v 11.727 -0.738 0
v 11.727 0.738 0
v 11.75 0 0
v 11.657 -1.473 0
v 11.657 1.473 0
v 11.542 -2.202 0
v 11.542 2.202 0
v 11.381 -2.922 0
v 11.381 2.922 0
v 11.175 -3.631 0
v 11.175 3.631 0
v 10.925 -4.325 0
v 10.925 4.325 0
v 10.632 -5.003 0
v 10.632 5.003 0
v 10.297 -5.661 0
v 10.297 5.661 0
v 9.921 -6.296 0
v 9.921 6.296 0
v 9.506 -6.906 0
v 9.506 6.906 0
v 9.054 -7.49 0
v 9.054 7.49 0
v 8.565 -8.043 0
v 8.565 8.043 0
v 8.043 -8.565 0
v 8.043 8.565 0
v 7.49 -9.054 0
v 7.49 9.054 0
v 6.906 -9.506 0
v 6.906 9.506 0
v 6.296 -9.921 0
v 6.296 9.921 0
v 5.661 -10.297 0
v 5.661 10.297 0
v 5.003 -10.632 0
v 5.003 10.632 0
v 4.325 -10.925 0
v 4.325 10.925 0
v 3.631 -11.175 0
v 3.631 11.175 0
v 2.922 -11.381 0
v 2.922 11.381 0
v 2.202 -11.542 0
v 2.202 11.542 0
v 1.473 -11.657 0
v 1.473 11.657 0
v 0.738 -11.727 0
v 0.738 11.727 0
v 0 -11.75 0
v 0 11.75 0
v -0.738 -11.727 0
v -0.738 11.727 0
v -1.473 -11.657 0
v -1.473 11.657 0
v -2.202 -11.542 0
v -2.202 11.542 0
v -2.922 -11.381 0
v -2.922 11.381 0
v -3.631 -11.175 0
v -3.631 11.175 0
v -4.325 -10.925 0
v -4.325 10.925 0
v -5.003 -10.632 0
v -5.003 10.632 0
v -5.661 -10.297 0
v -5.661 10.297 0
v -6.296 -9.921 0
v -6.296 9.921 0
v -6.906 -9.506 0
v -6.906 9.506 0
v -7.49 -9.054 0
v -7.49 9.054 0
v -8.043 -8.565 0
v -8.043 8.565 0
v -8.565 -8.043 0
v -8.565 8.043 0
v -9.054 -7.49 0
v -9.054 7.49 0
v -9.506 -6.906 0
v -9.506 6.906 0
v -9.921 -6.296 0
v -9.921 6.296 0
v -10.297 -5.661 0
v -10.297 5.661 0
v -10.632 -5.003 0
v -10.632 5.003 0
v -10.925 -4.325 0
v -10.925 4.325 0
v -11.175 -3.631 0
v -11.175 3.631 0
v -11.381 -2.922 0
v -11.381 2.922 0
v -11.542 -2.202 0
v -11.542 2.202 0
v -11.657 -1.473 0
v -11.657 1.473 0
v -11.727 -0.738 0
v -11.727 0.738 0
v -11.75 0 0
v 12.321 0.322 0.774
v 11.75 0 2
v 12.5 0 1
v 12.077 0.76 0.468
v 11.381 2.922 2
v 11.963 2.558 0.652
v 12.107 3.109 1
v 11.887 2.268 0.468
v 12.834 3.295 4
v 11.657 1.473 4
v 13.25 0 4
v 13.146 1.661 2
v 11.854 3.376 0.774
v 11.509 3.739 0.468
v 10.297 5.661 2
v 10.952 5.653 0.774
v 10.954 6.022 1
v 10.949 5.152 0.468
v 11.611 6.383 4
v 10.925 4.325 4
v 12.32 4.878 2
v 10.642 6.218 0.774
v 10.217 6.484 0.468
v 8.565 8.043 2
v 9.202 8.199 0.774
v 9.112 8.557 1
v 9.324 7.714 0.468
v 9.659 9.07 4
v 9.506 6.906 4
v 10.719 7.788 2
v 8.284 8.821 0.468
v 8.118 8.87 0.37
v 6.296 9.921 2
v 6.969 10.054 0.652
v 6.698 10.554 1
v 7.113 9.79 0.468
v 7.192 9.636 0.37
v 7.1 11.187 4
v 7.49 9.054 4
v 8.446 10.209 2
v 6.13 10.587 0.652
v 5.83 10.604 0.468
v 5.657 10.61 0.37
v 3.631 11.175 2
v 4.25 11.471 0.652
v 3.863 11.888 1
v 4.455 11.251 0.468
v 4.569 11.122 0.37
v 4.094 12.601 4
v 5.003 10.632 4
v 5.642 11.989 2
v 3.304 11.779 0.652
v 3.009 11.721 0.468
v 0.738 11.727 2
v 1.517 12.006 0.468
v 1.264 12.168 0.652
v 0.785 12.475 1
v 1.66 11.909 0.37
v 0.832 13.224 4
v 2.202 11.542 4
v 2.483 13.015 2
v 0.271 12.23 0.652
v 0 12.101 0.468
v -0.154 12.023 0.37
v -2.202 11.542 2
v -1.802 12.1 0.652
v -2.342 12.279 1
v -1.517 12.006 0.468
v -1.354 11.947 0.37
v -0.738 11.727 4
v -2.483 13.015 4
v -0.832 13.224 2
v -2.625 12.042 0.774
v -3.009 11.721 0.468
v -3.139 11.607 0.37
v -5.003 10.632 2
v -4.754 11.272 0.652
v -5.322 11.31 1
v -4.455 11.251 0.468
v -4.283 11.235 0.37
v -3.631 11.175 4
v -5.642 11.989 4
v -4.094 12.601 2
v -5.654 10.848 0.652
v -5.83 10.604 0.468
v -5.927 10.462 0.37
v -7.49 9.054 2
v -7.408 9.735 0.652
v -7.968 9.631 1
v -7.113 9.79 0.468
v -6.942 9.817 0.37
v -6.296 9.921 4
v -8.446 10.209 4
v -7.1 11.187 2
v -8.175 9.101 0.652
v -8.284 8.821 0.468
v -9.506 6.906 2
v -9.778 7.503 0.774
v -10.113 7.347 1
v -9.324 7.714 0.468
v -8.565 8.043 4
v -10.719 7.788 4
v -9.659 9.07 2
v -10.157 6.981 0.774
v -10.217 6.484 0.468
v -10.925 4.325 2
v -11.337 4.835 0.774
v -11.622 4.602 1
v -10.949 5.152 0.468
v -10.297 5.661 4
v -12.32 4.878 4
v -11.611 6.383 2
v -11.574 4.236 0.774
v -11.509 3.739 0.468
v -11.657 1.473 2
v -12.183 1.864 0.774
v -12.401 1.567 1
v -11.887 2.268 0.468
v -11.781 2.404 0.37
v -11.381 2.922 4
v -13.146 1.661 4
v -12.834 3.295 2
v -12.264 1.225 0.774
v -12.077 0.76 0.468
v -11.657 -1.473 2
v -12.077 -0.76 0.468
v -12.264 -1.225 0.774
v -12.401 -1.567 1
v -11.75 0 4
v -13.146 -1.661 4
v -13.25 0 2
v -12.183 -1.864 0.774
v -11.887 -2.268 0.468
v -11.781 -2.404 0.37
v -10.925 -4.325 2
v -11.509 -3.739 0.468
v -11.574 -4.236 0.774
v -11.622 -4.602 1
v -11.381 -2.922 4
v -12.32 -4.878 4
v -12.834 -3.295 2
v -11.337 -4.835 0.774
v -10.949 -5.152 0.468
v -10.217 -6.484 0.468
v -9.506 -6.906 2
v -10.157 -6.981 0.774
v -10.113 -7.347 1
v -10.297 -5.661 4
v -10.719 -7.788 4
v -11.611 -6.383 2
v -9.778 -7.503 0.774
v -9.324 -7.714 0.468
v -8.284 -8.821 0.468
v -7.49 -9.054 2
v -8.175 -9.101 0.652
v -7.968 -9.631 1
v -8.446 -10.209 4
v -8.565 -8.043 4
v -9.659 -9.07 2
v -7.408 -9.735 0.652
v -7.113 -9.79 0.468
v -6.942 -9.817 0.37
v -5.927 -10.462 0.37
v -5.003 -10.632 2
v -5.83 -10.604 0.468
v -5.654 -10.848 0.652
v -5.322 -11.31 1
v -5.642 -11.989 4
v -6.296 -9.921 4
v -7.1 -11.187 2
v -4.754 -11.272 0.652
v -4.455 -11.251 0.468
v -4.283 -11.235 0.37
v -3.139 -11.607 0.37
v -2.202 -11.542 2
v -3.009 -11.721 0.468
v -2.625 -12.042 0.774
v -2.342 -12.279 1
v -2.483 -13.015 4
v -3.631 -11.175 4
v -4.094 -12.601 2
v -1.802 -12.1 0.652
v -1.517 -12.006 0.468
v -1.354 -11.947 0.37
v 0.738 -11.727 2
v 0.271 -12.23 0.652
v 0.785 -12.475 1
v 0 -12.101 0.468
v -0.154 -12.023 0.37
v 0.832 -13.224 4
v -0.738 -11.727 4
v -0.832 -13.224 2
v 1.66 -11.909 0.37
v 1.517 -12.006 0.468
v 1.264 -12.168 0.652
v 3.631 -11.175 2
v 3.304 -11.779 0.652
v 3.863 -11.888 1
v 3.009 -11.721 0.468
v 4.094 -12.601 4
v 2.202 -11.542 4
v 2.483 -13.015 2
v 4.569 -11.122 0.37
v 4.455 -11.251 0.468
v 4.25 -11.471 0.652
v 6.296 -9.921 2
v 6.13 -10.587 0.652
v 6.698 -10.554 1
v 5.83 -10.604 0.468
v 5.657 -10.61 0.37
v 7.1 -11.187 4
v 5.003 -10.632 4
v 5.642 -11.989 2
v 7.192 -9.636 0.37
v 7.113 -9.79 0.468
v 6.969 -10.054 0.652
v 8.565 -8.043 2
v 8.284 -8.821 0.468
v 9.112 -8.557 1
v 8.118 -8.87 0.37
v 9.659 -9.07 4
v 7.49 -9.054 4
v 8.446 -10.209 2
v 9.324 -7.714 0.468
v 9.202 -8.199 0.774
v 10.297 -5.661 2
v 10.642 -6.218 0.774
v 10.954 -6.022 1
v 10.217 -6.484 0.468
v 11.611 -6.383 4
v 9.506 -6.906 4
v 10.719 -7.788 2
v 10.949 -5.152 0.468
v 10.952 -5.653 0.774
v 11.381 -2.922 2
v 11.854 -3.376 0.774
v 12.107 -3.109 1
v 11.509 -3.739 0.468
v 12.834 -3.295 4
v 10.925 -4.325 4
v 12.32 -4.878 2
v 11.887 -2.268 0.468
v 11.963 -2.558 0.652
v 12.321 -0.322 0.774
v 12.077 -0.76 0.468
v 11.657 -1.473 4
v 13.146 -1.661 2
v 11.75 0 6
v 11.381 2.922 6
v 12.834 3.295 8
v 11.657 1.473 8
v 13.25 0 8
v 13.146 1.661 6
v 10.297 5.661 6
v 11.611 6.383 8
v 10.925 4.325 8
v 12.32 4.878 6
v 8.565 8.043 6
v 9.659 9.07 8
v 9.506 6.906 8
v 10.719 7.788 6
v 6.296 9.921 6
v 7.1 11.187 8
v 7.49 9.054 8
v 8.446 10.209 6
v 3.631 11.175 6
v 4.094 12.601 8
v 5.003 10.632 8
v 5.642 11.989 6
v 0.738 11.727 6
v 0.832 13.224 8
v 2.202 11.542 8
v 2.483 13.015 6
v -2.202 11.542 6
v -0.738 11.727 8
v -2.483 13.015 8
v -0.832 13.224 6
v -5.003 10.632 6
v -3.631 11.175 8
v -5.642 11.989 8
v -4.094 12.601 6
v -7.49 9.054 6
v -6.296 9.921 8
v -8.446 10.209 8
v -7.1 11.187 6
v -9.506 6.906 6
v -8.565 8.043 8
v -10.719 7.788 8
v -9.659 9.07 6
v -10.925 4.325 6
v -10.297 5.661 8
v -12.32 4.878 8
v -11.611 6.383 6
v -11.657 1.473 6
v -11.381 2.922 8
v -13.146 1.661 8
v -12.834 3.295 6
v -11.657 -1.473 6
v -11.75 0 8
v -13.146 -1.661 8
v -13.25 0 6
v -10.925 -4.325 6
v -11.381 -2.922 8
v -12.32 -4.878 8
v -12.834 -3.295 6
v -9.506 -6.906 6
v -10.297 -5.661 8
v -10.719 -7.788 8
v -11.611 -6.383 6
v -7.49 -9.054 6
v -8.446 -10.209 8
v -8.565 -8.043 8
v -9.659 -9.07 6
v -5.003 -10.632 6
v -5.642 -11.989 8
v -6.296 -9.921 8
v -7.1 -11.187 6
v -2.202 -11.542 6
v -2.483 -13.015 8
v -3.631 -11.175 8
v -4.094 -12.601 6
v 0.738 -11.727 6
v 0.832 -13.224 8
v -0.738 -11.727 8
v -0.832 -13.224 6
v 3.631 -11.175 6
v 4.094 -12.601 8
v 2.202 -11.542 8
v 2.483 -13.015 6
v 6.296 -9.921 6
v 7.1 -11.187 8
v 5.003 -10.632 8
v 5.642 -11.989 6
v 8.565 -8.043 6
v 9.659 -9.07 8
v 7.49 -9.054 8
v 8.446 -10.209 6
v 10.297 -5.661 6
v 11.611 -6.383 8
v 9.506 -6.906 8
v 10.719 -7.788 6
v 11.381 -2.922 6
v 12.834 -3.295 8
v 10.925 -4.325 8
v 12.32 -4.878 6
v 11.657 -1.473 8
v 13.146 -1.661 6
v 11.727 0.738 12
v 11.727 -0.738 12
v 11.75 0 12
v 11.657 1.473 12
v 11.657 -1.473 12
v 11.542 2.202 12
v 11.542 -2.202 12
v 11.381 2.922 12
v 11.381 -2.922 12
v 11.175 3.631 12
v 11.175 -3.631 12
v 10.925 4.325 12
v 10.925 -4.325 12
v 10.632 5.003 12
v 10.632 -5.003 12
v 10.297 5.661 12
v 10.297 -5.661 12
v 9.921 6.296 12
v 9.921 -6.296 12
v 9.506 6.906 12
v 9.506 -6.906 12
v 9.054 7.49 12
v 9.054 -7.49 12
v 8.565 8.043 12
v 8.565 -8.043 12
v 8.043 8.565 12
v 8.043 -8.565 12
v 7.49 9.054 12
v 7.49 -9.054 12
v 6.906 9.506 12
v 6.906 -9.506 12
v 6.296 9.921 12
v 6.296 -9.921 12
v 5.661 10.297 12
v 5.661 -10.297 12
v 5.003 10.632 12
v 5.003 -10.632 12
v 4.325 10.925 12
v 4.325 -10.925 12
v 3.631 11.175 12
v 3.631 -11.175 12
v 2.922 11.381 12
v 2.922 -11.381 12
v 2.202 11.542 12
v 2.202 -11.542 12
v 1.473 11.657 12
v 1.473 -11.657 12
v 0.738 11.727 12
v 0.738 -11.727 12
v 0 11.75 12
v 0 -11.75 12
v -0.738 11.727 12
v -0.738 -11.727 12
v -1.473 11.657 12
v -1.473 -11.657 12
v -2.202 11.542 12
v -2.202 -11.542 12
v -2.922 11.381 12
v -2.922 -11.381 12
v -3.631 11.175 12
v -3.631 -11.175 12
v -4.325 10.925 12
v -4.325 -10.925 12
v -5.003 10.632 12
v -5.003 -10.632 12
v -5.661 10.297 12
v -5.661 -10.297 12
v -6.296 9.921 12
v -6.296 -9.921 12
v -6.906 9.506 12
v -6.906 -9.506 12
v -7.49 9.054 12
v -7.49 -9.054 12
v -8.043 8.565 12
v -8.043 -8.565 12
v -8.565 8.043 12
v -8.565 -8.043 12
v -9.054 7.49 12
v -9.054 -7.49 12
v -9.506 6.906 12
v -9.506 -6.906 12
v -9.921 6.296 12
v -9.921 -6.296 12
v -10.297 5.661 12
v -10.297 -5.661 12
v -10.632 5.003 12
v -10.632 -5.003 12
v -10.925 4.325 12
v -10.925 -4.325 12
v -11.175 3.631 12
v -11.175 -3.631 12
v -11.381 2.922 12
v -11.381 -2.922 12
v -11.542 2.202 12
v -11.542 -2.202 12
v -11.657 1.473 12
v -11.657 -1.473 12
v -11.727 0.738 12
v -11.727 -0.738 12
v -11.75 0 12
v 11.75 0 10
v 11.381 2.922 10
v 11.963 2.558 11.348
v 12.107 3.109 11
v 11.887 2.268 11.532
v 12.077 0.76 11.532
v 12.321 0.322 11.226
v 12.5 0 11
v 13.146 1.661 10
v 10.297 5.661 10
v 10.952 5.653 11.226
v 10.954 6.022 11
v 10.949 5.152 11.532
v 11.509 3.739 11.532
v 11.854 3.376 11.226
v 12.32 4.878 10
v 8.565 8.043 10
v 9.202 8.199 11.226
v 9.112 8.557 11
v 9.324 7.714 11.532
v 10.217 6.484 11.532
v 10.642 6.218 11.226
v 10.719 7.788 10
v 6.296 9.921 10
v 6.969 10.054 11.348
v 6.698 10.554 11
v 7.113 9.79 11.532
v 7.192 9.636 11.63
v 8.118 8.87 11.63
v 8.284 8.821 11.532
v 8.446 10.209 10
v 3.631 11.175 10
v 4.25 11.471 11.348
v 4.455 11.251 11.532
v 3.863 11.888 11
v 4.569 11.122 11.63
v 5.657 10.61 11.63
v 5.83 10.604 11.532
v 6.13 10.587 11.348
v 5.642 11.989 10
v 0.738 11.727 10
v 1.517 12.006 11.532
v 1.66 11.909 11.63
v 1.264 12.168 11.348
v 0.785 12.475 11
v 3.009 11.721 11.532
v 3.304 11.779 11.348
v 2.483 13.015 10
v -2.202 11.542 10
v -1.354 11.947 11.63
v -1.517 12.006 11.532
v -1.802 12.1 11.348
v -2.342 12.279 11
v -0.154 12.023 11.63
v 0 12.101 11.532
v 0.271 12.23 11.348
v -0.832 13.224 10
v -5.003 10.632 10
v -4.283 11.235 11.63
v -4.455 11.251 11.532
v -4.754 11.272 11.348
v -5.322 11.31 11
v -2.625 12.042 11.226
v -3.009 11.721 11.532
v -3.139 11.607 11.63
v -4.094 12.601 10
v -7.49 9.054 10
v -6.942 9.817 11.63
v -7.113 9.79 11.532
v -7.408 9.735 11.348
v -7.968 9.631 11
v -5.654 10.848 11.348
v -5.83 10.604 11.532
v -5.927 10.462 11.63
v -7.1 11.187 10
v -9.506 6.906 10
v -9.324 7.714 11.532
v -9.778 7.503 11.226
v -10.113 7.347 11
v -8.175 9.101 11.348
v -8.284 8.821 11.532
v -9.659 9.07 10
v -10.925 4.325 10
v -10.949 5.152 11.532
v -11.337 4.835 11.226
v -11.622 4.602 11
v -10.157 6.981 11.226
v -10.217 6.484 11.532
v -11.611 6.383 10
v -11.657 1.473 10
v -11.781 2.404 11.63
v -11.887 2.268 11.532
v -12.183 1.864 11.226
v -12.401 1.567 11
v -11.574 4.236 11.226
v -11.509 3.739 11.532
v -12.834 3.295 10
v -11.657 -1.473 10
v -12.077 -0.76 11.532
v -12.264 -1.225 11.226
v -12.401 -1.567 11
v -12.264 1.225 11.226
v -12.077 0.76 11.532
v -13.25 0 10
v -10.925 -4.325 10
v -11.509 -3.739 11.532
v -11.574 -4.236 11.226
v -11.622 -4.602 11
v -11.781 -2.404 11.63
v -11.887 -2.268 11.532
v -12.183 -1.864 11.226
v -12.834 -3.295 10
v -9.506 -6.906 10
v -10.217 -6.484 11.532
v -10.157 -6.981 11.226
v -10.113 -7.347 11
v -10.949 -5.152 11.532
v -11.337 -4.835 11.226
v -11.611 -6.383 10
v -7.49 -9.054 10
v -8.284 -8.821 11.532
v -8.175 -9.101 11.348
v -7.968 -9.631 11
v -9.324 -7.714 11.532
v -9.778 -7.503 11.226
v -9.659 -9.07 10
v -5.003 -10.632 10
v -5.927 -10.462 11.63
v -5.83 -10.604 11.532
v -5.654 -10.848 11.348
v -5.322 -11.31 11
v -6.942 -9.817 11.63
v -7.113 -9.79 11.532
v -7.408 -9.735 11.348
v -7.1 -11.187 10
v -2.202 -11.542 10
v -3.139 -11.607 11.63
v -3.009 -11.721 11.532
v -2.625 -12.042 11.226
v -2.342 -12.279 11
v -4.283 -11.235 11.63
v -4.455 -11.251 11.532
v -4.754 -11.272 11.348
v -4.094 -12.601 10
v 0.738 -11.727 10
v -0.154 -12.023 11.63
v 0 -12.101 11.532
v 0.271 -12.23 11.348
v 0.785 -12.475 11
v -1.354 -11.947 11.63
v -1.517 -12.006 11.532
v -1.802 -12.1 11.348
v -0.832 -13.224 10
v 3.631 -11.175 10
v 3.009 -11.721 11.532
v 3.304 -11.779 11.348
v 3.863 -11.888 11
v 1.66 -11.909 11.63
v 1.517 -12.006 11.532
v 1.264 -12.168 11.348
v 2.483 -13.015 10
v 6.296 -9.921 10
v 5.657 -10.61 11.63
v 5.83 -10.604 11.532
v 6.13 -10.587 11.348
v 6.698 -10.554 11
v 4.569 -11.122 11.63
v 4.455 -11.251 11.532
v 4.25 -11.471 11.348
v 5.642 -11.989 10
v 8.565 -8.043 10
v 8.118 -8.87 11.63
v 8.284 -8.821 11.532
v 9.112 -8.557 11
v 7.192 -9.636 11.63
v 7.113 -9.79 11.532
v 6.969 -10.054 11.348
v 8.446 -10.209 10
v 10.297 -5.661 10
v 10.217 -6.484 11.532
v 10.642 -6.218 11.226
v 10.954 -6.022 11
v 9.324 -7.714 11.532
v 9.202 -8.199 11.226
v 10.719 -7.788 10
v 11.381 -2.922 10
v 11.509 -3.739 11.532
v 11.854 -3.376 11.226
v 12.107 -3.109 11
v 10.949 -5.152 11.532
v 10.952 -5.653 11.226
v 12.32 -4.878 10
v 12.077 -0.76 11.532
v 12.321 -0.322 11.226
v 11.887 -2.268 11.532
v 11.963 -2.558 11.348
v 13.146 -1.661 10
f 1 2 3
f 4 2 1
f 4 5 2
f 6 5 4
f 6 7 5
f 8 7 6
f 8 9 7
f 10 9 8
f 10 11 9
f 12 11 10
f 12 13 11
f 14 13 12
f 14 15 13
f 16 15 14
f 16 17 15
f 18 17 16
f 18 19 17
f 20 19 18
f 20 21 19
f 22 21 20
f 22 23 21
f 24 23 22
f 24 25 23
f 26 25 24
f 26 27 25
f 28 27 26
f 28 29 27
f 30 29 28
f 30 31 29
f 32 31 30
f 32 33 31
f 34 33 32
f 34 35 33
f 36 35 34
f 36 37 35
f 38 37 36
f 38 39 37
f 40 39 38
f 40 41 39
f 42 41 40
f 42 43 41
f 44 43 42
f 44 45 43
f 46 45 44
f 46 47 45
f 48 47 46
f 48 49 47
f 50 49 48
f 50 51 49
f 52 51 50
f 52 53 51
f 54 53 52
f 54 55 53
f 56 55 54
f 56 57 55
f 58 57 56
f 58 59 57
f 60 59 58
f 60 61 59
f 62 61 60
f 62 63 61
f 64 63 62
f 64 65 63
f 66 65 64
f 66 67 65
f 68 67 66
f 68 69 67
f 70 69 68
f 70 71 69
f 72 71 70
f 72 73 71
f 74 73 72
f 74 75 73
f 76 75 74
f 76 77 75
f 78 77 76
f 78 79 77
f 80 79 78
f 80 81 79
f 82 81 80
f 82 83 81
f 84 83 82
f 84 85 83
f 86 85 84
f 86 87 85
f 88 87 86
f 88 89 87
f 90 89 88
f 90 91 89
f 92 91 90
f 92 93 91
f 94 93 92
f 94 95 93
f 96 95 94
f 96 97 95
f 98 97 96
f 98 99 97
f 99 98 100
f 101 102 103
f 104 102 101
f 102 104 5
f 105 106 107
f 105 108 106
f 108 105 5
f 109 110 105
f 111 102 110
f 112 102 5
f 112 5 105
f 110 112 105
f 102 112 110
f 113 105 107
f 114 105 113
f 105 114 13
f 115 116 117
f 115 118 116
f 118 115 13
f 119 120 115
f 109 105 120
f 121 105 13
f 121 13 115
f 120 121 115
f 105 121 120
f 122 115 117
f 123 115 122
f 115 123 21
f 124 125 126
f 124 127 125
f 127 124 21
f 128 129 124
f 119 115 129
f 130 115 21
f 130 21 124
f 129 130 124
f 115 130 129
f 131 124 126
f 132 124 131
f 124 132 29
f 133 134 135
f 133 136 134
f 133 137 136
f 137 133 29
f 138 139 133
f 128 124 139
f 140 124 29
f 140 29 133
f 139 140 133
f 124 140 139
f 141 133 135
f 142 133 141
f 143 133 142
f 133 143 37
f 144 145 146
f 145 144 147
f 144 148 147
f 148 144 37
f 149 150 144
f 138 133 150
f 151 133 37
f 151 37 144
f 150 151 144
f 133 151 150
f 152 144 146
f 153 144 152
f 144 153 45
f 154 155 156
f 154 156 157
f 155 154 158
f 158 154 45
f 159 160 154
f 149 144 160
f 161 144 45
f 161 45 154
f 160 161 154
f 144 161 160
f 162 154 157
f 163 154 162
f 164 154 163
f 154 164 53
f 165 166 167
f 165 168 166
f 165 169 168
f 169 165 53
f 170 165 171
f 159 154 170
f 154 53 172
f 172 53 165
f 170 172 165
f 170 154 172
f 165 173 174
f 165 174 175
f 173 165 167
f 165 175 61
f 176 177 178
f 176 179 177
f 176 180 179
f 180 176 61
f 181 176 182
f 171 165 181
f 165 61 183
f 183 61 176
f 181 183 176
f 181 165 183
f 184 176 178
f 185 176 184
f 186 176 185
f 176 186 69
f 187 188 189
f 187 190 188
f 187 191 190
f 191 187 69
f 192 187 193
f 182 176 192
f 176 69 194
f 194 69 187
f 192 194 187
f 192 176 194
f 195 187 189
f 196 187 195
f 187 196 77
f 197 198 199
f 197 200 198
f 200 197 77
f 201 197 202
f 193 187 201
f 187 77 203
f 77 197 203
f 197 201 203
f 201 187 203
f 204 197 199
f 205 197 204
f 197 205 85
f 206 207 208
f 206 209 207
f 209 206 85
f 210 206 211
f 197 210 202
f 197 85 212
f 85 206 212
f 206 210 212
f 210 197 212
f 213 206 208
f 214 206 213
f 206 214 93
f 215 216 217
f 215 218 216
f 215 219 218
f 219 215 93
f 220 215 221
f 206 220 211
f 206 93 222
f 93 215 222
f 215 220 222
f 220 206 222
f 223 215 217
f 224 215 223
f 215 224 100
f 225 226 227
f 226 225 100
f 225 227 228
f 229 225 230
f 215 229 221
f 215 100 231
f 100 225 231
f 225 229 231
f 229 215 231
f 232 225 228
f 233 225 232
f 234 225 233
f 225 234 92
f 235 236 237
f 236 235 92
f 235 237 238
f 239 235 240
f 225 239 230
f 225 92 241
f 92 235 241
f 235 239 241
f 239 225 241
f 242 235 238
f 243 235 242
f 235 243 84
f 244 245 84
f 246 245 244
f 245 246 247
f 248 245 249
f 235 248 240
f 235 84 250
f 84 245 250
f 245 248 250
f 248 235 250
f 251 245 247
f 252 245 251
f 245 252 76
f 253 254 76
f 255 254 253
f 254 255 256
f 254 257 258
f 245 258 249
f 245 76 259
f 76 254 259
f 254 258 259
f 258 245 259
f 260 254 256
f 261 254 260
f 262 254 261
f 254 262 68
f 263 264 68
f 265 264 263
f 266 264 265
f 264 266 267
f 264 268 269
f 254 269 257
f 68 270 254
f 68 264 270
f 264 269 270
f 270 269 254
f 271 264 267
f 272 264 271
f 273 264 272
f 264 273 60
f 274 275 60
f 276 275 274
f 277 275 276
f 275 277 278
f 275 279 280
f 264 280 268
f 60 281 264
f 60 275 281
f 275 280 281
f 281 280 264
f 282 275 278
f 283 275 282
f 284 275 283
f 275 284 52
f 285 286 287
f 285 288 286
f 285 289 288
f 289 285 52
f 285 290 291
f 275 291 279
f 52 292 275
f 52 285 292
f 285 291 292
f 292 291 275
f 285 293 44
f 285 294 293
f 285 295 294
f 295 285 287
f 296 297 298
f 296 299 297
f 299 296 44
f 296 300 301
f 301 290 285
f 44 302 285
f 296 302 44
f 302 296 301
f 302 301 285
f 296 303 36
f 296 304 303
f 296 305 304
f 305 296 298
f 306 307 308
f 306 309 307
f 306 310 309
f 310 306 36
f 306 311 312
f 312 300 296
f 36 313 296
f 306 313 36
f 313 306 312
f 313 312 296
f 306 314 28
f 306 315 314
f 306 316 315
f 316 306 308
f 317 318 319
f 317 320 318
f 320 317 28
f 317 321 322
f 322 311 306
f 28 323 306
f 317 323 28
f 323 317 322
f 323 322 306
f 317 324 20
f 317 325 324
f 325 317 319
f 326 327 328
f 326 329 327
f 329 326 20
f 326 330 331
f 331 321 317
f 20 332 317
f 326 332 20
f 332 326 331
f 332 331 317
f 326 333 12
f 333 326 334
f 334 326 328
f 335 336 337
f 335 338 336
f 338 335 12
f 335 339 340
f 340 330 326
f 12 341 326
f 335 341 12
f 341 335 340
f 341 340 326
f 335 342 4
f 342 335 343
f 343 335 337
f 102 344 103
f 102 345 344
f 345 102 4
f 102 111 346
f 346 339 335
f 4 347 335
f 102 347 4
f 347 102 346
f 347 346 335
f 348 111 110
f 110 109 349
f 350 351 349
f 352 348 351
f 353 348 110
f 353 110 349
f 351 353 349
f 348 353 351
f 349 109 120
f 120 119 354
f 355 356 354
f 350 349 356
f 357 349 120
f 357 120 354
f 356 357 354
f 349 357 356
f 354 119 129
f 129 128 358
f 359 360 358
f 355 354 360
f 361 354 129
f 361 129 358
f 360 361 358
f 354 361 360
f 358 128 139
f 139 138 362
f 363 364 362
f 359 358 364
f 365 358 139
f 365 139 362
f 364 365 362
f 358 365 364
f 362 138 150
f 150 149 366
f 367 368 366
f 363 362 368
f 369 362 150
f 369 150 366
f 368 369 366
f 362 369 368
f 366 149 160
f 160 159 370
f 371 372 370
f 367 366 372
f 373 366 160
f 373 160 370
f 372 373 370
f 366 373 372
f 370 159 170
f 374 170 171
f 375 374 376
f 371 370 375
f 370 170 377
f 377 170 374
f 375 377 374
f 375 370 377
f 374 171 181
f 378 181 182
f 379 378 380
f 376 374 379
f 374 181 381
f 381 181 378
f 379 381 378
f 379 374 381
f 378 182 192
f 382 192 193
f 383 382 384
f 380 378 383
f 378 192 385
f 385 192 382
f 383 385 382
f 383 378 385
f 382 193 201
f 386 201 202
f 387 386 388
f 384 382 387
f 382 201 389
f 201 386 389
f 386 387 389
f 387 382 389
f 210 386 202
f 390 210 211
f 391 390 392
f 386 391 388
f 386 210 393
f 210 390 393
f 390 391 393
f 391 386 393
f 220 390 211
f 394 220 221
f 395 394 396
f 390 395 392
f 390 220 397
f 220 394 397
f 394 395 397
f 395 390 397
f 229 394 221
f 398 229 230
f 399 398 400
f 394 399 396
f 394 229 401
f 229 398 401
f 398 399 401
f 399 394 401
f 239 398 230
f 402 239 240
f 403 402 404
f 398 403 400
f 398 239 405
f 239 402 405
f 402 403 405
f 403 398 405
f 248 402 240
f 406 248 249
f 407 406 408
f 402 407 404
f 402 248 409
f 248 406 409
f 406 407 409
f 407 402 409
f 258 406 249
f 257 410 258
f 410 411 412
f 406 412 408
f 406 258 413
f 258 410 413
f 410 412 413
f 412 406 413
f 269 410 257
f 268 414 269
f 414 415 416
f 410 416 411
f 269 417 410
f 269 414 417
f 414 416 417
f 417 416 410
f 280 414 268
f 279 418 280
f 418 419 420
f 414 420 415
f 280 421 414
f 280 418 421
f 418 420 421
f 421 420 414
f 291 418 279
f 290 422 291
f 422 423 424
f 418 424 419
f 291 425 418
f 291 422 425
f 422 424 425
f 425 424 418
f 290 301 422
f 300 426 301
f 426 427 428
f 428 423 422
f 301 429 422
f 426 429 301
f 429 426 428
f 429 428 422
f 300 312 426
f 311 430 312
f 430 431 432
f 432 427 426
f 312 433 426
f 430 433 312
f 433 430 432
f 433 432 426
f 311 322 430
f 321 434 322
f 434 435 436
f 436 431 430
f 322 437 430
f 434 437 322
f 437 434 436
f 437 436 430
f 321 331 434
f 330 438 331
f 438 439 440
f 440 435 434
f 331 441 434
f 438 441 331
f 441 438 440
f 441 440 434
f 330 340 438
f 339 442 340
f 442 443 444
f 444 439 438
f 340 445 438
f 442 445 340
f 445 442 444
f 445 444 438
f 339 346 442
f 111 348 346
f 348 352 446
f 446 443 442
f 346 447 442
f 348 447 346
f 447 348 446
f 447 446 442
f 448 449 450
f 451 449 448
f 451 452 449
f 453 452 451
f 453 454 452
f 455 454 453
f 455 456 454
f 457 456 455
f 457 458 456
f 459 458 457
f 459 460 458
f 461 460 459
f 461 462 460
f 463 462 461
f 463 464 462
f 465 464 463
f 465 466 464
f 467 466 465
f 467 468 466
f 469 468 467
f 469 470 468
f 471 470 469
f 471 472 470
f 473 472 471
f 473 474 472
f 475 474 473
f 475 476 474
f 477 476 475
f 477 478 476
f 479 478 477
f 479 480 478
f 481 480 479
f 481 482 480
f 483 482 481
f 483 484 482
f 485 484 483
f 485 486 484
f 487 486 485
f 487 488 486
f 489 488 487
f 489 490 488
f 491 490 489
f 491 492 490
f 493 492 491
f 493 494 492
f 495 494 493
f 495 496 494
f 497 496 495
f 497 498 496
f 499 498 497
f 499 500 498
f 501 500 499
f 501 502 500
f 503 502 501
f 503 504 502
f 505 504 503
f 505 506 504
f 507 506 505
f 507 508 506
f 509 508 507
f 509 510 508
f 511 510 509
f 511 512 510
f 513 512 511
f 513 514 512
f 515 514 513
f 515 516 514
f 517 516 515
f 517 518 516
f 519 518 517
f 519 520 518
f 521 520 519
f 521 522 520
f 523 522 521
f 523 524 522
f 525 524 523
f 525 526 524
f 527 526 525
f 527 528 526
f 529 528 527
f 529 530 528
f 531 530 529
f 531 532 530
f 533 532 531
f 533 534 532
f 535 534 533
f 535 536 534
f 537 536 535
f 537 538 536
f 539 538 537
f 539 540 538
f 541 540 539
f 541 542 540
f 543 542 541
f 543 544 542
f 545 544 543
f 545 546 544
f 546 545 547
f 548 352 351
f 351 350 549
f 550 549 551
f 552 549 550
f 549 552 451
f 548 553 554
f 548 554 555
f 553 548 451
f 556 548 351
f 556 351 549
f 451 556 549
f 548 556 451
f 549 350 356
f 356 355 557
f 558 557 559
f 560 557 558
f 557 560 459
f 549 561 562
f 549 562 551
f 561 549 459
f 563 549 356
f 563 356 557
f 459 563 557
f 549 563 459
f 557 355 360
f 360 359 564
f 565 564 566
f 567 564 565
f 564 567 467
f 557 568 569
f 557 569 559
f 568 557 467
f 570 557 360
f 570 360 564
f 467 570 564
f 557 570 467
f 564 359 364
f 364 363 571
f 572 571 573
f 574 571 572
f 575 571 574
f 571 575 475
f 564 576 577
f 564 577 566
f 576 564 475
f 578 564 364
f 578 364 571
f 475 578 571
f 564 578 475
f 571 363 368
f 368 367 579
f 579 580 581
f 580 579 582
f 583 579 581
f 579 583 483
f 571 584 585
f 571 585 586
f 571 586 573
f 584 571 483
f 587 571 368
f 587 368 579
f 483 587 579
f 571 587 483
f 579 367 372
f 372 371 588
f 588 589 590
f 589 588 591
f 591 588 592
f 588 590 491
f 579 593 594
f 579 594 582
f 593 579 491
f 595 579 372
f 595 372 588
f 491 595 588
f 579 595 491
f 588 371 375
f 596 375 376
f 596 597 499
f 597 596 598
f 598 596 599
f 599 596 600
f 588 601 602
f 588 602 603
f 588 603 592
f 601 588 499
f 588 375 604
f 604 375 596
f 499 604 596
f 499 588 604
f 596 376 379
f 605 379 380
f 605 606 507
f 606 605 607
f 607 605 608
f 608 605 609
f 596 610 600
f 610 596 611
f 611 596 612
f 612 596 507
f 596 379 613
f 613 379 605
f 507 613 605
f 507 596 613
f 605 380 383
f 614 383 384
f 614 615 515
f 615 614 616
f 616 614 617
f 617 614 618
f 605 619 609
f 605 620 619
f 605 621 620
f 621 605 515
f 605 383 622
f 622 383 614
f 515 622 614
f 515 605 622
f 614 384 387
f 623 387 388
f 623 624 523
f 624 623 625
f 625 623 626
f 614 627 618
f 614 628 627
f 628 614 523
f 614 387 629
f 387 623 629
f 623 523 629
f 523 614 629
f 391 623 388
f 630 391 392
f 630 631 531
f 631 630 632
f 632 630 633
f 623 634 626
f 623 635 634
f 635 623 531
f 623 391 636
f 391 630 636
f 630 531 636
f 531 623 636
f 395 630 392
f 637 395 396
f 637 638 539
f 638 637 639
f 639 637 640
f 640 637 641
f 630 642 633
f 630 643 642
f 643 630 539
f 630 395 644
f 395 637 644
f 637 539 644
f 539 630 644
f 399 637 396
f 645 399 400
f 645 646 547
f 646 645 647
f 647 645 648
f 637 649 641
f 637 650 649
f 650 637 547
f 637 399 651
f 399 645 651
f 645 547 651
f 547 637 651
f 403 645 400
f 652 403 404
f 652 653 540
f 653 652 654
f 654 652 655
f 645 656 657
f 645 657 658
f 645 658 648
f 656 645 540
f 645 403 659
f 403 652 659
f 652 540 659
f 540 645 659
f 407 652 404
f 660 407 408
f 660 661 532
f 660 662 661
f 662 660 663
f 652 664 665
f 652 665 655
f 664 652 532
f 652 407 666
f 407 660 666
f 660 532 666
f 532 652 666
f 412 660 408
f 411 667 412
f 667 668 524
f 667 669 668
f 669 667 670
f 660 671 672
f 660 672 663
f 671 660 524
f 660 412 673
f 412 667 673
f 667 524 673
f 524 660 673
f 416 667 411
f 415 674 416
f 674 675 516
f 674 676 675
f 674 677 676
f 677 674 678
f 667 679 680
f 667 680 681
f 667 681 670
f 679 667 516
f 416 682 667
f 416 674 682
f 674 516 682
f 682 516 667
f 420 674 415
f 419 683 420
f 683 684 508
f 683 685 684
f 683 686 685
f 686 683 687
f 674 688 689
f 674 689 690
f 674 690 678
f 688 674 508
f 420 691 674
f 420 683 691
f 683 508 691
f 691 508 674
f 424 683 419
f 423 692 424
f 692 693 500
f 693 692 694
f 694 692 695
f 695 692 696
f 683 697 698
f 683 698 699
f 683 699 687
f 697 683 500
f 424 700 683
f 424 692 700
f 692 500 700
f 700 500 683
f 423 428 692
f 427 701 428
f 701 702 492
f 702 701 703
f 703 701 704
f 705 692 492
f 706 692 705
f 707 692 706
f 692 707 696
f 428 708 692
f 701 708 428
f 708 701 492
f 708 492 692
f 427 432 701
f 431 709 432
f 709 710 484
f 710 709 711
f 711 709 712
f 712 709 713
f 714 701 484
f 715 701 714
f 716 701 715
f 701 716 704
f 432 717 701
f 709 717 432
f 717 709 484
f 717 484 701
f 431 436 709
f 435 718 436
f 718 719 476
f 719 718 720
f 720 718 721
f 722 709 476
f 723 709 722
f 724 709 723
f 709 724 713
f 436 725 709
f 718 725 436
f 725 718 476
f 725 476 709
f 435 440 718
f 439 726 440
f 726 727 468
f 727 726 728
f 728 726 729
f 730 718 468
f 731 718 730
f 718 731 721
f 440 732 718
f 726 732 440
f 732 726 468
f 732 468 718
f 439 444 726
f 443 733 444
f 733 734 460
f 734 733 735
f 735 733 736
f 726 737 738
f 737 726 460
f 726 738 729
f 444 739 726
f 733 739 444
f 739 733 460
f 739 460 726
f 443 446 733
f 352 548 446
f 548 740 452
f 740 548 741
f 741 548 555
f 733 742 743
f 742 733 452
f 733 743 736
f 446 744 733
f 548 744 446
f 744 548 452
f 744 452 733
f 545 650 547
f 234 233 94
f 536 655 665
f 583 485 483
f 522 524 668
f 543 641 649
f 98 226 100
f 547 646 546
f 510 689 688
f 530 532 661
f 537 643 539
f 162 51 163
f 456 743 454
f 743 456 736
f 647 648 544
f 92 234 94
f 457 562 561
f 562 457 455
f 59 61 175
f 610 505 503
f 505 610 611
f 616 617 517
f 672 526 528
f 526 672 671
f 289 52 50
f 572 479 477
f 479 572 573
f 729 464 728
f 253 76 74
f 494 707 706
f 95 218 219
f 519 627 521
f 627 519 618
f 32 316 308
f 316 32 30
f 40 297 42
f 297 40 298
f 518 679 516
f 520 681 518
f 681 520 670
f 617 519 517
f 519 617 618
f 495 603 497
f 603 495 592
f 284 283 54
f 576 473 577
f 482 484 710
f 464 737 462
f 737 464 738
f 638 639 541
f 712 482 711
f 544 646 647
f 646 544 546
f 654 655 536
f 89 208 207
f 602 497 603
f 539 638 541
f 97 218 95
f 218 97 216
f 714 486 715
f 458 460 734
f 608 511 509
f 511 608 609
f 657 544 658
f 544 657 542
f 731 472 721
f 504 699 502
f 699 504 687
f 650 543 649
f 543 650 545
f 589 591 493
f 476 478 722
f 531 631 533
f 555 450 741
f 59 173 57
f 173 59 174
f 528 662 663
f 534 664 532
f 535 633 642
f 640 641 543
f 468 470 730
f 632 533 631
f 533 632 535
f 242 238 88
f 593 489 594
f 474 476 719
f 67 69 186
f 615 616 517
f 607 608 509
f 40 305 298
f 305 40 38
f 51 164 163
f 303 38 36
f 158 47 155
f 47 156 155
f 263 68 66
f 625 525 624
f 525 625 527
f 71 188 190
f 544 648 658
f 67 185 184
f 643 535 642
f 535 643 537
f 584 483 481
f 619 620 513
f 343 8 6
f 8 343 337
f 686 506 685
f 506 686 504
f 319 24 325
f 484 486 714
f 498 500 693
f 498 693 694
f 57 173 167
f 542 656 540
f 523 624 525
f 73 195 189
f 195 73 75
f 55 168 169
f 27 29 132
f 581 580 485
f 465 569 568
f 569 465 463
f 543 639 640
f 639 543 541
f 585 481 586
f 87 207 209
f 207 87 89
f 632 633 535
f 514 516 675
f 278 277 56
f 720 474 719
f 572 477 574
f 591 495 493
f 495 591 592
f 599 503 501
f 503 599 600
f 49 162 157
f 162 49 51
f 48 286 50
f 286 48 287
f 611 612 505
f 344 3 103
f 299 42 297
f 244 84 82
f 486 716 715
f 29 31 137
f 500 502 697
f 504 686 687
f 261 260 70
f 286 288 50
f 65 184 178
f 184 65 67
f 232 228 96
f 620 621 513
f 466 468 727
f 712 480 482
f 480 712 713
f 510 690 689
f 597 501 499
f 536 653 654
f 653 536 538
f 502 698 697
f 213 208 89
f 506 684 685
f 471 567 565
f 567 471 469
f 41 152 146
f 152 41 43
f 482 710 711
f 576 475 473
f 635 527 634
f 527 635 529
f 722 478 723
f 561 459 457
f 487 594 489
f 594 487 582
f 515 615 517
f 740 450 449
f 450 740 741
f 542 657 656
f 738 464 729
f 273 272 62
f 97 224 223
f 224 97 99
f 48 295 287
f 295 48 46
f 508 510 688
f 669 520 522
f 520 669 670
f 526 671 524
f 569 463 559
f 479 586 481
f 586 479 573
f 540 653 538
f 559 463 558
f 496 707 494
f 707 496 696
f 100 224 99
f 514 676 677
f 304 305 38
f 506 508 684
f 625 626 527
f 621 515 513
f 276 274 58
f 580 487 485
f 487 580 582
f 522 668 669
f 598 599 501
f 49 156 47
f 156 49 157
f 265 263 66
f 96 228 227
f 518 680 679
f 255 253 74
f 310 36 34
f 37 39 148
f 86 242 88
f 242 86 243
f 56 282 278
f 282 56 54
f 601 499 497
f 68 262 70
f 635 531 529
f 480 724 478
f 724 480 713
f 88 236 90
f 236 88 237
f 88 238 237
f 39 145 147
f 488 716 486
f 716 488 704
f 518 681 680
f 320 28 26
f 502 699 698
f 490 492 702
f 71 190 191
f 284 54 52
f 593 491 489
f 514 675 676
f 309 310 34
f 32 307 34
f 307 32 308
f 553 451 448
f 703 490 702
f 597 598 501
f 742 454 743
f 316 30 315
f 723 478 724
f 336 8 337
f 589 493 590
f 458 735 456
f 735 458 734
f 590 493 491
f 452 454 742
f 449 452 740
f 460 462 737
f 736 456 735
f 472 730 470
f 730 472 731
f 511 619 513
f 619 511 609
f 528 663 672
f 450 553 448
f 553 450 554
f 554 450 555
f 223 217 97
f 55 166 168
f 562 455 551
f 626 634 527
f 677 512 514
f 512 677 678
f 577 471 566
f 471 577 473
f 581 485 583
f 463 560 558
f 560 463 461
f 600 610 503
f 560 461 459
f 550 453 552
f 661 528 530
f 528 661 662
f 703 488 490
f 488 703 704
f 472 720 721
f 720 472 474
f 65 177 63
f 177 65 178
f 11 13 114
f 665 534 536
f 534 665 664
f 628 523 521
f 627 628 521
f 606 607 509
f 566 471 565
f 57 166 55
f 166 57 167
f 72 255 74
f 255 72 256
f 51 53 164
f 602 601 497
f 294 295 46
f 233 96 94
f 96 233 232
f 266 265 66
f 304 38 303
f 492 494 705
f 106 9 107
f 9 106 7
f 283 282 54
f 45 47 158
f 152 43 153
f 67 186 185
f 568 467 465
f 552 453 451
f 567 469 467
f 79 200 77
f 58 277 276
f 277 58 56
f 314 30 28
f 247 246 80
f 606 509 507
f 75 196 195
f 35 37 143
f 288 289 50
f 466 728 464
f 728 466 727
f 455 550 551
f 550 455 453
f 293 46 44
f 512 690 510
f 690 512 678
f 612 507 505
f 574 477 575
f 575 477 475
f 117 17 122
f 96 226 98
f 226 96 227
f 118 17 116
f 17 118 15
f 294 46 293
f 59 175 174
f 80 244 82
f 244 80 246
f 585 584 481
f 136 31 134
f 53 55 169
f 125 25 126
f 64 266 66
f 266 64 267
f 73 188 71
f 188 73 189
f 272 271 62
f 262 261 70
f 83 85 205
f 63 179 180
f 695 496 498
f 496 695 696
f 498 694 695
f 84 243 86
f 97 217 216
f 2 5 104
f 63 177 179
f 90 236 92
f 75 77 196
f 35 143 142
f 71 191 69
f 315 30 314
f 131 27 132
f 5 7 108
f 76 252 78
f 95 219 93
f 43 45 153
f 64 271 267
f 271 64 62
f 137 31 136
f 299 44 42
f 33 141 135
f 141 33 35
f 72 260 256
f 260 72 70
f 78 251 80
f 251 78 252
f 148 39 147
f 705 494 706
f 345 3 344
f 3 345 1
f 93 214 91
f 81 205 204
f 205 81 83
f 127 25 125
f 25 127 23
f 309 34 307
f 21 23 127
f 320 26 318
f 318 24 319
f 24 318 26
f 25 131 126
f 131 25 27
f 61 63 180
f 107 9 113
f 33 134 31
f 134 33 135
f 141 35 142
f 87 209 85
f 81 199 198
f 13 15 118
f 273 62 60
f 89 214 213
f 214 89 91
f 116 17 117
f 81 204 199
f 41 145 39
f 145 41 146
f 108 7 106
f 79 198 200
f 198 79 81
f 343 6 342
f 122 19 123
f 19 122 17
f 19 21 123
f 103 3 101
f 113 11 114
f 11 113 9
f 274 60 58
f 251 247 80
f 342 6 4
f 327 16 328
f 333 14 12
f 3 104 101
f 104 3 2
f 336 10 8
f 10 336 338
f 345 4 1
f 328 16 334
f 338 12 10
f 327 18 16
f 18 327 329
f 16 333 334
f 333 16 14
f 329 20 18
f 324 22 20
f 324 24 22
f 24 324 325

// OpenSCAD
/*
 * knurledFinishLib_v2.scad
 * 
 * Written by aubenc @ Thingiverse
 *
 * This script is licensed under the Public Domain license.
 *
 * http://www.thingiverse.com/thing:31122
 *
 * Derived from knurledFinishLib.scad (also Public Domain license) available at
 *
 * http://www.thingiverse.com/thing:9095
 *
 * Usage:
 *
 *	 Drop this script somewhere where OpenSCAD can find it (your current project's
 *	 working directory/folder or your OpenSCAD libraries directory/folder).
 *
 *	 Add the line:
 *
 *		use <knurledFinishLib_v2.scad>
 *
 *	 in your OpenSCAD script and call either...
 *
 *    knurledCylinder(Knurled cylinder height,
 *                 Knurled cylinder outer diameter,
 *                 Knurl polyhedron width,
 *                 Knurl polyhedron height,
 *                 Knurl polyhedron depth,
 *                 Cylinder ends smoothed height,
 *                 Knurled surface smoothing amount );
 *
 *  Call the module ' help(); ' for a little bit more of detail
 *  and/or take a look to the PDF available at http://www.thingiverse.com/thing:9095
 *  for a in depth descrition of the knurl properties.
 */

module knurledCylinder(height = 12, outerDiameter = 25, knurlWidth = 3, knurlHeight = 4, knurlDepth = 1.5, bevelHeight = 2, surfaceSmoothing = 0) {
    cord = (outerDiameter + knurlDepth + knurlDepth * surfaceSmoothing / 100) / 2;
    cird = cord - knurlDepth;
    cfn = round(2 * cird * PI / knurlWidth);
    clf = 360 / cfn;
    crn = ceil(height / knurlHeight);

    echo("knurled cylinder max diameter: ", 2 * cord);
    echo("knurled cylinder min diameter: ", 2 * cird);

	 if(bevelHeight < 0) {
        union() {
            shape(bevelHeight, cird+knurlDepth*surfaceSmoothing/100, cord, cfn*4, height);
            translate([0,0,-(crn*knurlHeight-height)/2]) knurledFinish(cord, cird, clf, knurlHeight, cfn, crn);
        }
    } else if (bevelHeight == 0) {
        intersection() {
            cylinder(h=height, r=cord-knurlDepth*surfaceSmoothing/100, $fn=2*cfn, center=false);
            translate([0,0,-(crn*knurlHeight-height)/2]) knurledFinish(cord, cird, clf, knurlHeight, cfn, crn);
        }
    } else {
        intersection() {
            shape(bevelHeight, cird, cord-knurlDepth*surfaceSmoothing/100, cfn*4, height);
            translate([0,0,-(crn*knurlHeight-height)/2]) knurledFinish(cord, cird, clf, knurlHeight, cfn, crn);
        }
    }
}

module shape(hsh, ird, ord, fn4, hg) {
	x0 = 0;	
    x1 = hsh > 0 ? ird : ord;		
    x2 = hsh > 0 ? ord : ird;
	y0 = -0.1;	
    y1 = 0;	
    y2 = abs(hsh);	
    y3 = hg - abs(hsh);	
    y4 = hg;	
    y5 = hg + 0.1;

	if (hsh >= 0) {
		rotate_extrude(convexity=10, $fn=fn4)
		polygon(points=[ [x0,y1],[x1,y1],[x2,y2],[x2,y3],[x1,y4],[x0,y4]	],
					paths=[	[0,1,2,3,4,5]	]);
	} else {
		rotate_extrude(convexity=10, $fn=fn4)
		polygon(points=[ [x0,y0],[x1,y0],[x1,y1],[x2,y2], [x2,y3],[x1,y4],[x1,y5],[x0,y5] ],
					paths=[	[0,1,2,3,4,5,6,7] ]);
	}
}

module knurledFinish(ord, ird, lf, sh, fn, rn) {
    for(j = [ 0 : rn - 1 ]) {
        h0 = sh * j; 
        h1 = sh * (j + 1 / 2); 
        h2 = sh * (j + 1);
        for(i = [ 0 : fn - 1 ]) {
            lf0 = lf * i; 
            lf1 = lf * (i + 1 / 2); 
            lf2 = lf * (i + 1);
            polyhedron(
                points=[
                     [ 0,0,h0],
                     [ ord*cos(lf0), ord*sin(lf0), h0],
                     [ ird*cos(lf1), ird*sin(lf1), h0],
                     [ ord*cos(lf2), ord*sin(lf2), h0],

                     [ ird*cos(lf0), ird*sin(lf0), h1],
                     [ ord*cos(lf1), ord*sin(lf1), h1],
                     [ ird*cos(lf2), ird*sin(lf2), h1],

                     [ 0,0,h2],
                     [ ord*cos(lf0), ord*sin(lf0), h2],
                     [ ird*cos(lf1), ird*sin(lf1), h2],
                     [ ord*cos(lf2), ord*sin(lf2), h2]
                    ],
                faces=[
                     [0,1,2],[2,3,0],
                     [1,0,4],[4,0,7],[7,8,4],
                     [8,7,9],[10,9,7],
                     [10,7,6],[6,7,0],[3,6,0],
                     [2,1,4],[3,2,6],[10,6,9],[8,9,4],
                     [4,5,2],[2,5,6],[6,5,9],[9,5,4]
                    ],
                convexity=5);
         }
    }
}

module knurlHelp()
{
	echo();
	echo("    Knurled Surface Library  v2  ");
   echo("");
	echo("      Modules:    ");
	echo("");
	echo("        knurled_cyl(parameters... );    -    Requires a value for each an every expected parameter (see bellow)    ");
	echo("");
	echo("        knurl();    -    Call to the previous module with a set of default parameters,    ");
	echo("                                  values may be changed by adding 'parameter_name=value'        i.e.     knurl(s_smooth=40);    ");
	echo("");
	echo("      Parameters, all of them in mm but the last one.    ");
	echo("");
	echo("        k_cyl_hg       -   [ 12   ]  ,,  Height for the knurled cylinder    ");
	echo("        k_cyl_od      -   [ 25   ]  ,,  Cylinder's Outer Diameter before applying the knurled surfacefinishing.    ");
	echo("        knurl_wd     -   [   3   ]  ,,  Knurl's Width.    ");
	echo("        knurl_hg      -   [   4   ]  ,,  Knurl's Height.    ");
	echo("        knurl_dp     -   [  1.5 ]  ,,  Knurl's Depth.    ");
	echo("        e_smooth   -    [  2   ]  ,,  Bevel's Height at the bottom and the top of the cylinder    ");
	echo("        s_smooth   -    [  0   ]  ,,  Knurl's Surface Smoothing :  File donwn the top of the knurl this value, i.e. 40 will snooth it a 40%.    ");
	echo("");
}

knurledCylinder();
